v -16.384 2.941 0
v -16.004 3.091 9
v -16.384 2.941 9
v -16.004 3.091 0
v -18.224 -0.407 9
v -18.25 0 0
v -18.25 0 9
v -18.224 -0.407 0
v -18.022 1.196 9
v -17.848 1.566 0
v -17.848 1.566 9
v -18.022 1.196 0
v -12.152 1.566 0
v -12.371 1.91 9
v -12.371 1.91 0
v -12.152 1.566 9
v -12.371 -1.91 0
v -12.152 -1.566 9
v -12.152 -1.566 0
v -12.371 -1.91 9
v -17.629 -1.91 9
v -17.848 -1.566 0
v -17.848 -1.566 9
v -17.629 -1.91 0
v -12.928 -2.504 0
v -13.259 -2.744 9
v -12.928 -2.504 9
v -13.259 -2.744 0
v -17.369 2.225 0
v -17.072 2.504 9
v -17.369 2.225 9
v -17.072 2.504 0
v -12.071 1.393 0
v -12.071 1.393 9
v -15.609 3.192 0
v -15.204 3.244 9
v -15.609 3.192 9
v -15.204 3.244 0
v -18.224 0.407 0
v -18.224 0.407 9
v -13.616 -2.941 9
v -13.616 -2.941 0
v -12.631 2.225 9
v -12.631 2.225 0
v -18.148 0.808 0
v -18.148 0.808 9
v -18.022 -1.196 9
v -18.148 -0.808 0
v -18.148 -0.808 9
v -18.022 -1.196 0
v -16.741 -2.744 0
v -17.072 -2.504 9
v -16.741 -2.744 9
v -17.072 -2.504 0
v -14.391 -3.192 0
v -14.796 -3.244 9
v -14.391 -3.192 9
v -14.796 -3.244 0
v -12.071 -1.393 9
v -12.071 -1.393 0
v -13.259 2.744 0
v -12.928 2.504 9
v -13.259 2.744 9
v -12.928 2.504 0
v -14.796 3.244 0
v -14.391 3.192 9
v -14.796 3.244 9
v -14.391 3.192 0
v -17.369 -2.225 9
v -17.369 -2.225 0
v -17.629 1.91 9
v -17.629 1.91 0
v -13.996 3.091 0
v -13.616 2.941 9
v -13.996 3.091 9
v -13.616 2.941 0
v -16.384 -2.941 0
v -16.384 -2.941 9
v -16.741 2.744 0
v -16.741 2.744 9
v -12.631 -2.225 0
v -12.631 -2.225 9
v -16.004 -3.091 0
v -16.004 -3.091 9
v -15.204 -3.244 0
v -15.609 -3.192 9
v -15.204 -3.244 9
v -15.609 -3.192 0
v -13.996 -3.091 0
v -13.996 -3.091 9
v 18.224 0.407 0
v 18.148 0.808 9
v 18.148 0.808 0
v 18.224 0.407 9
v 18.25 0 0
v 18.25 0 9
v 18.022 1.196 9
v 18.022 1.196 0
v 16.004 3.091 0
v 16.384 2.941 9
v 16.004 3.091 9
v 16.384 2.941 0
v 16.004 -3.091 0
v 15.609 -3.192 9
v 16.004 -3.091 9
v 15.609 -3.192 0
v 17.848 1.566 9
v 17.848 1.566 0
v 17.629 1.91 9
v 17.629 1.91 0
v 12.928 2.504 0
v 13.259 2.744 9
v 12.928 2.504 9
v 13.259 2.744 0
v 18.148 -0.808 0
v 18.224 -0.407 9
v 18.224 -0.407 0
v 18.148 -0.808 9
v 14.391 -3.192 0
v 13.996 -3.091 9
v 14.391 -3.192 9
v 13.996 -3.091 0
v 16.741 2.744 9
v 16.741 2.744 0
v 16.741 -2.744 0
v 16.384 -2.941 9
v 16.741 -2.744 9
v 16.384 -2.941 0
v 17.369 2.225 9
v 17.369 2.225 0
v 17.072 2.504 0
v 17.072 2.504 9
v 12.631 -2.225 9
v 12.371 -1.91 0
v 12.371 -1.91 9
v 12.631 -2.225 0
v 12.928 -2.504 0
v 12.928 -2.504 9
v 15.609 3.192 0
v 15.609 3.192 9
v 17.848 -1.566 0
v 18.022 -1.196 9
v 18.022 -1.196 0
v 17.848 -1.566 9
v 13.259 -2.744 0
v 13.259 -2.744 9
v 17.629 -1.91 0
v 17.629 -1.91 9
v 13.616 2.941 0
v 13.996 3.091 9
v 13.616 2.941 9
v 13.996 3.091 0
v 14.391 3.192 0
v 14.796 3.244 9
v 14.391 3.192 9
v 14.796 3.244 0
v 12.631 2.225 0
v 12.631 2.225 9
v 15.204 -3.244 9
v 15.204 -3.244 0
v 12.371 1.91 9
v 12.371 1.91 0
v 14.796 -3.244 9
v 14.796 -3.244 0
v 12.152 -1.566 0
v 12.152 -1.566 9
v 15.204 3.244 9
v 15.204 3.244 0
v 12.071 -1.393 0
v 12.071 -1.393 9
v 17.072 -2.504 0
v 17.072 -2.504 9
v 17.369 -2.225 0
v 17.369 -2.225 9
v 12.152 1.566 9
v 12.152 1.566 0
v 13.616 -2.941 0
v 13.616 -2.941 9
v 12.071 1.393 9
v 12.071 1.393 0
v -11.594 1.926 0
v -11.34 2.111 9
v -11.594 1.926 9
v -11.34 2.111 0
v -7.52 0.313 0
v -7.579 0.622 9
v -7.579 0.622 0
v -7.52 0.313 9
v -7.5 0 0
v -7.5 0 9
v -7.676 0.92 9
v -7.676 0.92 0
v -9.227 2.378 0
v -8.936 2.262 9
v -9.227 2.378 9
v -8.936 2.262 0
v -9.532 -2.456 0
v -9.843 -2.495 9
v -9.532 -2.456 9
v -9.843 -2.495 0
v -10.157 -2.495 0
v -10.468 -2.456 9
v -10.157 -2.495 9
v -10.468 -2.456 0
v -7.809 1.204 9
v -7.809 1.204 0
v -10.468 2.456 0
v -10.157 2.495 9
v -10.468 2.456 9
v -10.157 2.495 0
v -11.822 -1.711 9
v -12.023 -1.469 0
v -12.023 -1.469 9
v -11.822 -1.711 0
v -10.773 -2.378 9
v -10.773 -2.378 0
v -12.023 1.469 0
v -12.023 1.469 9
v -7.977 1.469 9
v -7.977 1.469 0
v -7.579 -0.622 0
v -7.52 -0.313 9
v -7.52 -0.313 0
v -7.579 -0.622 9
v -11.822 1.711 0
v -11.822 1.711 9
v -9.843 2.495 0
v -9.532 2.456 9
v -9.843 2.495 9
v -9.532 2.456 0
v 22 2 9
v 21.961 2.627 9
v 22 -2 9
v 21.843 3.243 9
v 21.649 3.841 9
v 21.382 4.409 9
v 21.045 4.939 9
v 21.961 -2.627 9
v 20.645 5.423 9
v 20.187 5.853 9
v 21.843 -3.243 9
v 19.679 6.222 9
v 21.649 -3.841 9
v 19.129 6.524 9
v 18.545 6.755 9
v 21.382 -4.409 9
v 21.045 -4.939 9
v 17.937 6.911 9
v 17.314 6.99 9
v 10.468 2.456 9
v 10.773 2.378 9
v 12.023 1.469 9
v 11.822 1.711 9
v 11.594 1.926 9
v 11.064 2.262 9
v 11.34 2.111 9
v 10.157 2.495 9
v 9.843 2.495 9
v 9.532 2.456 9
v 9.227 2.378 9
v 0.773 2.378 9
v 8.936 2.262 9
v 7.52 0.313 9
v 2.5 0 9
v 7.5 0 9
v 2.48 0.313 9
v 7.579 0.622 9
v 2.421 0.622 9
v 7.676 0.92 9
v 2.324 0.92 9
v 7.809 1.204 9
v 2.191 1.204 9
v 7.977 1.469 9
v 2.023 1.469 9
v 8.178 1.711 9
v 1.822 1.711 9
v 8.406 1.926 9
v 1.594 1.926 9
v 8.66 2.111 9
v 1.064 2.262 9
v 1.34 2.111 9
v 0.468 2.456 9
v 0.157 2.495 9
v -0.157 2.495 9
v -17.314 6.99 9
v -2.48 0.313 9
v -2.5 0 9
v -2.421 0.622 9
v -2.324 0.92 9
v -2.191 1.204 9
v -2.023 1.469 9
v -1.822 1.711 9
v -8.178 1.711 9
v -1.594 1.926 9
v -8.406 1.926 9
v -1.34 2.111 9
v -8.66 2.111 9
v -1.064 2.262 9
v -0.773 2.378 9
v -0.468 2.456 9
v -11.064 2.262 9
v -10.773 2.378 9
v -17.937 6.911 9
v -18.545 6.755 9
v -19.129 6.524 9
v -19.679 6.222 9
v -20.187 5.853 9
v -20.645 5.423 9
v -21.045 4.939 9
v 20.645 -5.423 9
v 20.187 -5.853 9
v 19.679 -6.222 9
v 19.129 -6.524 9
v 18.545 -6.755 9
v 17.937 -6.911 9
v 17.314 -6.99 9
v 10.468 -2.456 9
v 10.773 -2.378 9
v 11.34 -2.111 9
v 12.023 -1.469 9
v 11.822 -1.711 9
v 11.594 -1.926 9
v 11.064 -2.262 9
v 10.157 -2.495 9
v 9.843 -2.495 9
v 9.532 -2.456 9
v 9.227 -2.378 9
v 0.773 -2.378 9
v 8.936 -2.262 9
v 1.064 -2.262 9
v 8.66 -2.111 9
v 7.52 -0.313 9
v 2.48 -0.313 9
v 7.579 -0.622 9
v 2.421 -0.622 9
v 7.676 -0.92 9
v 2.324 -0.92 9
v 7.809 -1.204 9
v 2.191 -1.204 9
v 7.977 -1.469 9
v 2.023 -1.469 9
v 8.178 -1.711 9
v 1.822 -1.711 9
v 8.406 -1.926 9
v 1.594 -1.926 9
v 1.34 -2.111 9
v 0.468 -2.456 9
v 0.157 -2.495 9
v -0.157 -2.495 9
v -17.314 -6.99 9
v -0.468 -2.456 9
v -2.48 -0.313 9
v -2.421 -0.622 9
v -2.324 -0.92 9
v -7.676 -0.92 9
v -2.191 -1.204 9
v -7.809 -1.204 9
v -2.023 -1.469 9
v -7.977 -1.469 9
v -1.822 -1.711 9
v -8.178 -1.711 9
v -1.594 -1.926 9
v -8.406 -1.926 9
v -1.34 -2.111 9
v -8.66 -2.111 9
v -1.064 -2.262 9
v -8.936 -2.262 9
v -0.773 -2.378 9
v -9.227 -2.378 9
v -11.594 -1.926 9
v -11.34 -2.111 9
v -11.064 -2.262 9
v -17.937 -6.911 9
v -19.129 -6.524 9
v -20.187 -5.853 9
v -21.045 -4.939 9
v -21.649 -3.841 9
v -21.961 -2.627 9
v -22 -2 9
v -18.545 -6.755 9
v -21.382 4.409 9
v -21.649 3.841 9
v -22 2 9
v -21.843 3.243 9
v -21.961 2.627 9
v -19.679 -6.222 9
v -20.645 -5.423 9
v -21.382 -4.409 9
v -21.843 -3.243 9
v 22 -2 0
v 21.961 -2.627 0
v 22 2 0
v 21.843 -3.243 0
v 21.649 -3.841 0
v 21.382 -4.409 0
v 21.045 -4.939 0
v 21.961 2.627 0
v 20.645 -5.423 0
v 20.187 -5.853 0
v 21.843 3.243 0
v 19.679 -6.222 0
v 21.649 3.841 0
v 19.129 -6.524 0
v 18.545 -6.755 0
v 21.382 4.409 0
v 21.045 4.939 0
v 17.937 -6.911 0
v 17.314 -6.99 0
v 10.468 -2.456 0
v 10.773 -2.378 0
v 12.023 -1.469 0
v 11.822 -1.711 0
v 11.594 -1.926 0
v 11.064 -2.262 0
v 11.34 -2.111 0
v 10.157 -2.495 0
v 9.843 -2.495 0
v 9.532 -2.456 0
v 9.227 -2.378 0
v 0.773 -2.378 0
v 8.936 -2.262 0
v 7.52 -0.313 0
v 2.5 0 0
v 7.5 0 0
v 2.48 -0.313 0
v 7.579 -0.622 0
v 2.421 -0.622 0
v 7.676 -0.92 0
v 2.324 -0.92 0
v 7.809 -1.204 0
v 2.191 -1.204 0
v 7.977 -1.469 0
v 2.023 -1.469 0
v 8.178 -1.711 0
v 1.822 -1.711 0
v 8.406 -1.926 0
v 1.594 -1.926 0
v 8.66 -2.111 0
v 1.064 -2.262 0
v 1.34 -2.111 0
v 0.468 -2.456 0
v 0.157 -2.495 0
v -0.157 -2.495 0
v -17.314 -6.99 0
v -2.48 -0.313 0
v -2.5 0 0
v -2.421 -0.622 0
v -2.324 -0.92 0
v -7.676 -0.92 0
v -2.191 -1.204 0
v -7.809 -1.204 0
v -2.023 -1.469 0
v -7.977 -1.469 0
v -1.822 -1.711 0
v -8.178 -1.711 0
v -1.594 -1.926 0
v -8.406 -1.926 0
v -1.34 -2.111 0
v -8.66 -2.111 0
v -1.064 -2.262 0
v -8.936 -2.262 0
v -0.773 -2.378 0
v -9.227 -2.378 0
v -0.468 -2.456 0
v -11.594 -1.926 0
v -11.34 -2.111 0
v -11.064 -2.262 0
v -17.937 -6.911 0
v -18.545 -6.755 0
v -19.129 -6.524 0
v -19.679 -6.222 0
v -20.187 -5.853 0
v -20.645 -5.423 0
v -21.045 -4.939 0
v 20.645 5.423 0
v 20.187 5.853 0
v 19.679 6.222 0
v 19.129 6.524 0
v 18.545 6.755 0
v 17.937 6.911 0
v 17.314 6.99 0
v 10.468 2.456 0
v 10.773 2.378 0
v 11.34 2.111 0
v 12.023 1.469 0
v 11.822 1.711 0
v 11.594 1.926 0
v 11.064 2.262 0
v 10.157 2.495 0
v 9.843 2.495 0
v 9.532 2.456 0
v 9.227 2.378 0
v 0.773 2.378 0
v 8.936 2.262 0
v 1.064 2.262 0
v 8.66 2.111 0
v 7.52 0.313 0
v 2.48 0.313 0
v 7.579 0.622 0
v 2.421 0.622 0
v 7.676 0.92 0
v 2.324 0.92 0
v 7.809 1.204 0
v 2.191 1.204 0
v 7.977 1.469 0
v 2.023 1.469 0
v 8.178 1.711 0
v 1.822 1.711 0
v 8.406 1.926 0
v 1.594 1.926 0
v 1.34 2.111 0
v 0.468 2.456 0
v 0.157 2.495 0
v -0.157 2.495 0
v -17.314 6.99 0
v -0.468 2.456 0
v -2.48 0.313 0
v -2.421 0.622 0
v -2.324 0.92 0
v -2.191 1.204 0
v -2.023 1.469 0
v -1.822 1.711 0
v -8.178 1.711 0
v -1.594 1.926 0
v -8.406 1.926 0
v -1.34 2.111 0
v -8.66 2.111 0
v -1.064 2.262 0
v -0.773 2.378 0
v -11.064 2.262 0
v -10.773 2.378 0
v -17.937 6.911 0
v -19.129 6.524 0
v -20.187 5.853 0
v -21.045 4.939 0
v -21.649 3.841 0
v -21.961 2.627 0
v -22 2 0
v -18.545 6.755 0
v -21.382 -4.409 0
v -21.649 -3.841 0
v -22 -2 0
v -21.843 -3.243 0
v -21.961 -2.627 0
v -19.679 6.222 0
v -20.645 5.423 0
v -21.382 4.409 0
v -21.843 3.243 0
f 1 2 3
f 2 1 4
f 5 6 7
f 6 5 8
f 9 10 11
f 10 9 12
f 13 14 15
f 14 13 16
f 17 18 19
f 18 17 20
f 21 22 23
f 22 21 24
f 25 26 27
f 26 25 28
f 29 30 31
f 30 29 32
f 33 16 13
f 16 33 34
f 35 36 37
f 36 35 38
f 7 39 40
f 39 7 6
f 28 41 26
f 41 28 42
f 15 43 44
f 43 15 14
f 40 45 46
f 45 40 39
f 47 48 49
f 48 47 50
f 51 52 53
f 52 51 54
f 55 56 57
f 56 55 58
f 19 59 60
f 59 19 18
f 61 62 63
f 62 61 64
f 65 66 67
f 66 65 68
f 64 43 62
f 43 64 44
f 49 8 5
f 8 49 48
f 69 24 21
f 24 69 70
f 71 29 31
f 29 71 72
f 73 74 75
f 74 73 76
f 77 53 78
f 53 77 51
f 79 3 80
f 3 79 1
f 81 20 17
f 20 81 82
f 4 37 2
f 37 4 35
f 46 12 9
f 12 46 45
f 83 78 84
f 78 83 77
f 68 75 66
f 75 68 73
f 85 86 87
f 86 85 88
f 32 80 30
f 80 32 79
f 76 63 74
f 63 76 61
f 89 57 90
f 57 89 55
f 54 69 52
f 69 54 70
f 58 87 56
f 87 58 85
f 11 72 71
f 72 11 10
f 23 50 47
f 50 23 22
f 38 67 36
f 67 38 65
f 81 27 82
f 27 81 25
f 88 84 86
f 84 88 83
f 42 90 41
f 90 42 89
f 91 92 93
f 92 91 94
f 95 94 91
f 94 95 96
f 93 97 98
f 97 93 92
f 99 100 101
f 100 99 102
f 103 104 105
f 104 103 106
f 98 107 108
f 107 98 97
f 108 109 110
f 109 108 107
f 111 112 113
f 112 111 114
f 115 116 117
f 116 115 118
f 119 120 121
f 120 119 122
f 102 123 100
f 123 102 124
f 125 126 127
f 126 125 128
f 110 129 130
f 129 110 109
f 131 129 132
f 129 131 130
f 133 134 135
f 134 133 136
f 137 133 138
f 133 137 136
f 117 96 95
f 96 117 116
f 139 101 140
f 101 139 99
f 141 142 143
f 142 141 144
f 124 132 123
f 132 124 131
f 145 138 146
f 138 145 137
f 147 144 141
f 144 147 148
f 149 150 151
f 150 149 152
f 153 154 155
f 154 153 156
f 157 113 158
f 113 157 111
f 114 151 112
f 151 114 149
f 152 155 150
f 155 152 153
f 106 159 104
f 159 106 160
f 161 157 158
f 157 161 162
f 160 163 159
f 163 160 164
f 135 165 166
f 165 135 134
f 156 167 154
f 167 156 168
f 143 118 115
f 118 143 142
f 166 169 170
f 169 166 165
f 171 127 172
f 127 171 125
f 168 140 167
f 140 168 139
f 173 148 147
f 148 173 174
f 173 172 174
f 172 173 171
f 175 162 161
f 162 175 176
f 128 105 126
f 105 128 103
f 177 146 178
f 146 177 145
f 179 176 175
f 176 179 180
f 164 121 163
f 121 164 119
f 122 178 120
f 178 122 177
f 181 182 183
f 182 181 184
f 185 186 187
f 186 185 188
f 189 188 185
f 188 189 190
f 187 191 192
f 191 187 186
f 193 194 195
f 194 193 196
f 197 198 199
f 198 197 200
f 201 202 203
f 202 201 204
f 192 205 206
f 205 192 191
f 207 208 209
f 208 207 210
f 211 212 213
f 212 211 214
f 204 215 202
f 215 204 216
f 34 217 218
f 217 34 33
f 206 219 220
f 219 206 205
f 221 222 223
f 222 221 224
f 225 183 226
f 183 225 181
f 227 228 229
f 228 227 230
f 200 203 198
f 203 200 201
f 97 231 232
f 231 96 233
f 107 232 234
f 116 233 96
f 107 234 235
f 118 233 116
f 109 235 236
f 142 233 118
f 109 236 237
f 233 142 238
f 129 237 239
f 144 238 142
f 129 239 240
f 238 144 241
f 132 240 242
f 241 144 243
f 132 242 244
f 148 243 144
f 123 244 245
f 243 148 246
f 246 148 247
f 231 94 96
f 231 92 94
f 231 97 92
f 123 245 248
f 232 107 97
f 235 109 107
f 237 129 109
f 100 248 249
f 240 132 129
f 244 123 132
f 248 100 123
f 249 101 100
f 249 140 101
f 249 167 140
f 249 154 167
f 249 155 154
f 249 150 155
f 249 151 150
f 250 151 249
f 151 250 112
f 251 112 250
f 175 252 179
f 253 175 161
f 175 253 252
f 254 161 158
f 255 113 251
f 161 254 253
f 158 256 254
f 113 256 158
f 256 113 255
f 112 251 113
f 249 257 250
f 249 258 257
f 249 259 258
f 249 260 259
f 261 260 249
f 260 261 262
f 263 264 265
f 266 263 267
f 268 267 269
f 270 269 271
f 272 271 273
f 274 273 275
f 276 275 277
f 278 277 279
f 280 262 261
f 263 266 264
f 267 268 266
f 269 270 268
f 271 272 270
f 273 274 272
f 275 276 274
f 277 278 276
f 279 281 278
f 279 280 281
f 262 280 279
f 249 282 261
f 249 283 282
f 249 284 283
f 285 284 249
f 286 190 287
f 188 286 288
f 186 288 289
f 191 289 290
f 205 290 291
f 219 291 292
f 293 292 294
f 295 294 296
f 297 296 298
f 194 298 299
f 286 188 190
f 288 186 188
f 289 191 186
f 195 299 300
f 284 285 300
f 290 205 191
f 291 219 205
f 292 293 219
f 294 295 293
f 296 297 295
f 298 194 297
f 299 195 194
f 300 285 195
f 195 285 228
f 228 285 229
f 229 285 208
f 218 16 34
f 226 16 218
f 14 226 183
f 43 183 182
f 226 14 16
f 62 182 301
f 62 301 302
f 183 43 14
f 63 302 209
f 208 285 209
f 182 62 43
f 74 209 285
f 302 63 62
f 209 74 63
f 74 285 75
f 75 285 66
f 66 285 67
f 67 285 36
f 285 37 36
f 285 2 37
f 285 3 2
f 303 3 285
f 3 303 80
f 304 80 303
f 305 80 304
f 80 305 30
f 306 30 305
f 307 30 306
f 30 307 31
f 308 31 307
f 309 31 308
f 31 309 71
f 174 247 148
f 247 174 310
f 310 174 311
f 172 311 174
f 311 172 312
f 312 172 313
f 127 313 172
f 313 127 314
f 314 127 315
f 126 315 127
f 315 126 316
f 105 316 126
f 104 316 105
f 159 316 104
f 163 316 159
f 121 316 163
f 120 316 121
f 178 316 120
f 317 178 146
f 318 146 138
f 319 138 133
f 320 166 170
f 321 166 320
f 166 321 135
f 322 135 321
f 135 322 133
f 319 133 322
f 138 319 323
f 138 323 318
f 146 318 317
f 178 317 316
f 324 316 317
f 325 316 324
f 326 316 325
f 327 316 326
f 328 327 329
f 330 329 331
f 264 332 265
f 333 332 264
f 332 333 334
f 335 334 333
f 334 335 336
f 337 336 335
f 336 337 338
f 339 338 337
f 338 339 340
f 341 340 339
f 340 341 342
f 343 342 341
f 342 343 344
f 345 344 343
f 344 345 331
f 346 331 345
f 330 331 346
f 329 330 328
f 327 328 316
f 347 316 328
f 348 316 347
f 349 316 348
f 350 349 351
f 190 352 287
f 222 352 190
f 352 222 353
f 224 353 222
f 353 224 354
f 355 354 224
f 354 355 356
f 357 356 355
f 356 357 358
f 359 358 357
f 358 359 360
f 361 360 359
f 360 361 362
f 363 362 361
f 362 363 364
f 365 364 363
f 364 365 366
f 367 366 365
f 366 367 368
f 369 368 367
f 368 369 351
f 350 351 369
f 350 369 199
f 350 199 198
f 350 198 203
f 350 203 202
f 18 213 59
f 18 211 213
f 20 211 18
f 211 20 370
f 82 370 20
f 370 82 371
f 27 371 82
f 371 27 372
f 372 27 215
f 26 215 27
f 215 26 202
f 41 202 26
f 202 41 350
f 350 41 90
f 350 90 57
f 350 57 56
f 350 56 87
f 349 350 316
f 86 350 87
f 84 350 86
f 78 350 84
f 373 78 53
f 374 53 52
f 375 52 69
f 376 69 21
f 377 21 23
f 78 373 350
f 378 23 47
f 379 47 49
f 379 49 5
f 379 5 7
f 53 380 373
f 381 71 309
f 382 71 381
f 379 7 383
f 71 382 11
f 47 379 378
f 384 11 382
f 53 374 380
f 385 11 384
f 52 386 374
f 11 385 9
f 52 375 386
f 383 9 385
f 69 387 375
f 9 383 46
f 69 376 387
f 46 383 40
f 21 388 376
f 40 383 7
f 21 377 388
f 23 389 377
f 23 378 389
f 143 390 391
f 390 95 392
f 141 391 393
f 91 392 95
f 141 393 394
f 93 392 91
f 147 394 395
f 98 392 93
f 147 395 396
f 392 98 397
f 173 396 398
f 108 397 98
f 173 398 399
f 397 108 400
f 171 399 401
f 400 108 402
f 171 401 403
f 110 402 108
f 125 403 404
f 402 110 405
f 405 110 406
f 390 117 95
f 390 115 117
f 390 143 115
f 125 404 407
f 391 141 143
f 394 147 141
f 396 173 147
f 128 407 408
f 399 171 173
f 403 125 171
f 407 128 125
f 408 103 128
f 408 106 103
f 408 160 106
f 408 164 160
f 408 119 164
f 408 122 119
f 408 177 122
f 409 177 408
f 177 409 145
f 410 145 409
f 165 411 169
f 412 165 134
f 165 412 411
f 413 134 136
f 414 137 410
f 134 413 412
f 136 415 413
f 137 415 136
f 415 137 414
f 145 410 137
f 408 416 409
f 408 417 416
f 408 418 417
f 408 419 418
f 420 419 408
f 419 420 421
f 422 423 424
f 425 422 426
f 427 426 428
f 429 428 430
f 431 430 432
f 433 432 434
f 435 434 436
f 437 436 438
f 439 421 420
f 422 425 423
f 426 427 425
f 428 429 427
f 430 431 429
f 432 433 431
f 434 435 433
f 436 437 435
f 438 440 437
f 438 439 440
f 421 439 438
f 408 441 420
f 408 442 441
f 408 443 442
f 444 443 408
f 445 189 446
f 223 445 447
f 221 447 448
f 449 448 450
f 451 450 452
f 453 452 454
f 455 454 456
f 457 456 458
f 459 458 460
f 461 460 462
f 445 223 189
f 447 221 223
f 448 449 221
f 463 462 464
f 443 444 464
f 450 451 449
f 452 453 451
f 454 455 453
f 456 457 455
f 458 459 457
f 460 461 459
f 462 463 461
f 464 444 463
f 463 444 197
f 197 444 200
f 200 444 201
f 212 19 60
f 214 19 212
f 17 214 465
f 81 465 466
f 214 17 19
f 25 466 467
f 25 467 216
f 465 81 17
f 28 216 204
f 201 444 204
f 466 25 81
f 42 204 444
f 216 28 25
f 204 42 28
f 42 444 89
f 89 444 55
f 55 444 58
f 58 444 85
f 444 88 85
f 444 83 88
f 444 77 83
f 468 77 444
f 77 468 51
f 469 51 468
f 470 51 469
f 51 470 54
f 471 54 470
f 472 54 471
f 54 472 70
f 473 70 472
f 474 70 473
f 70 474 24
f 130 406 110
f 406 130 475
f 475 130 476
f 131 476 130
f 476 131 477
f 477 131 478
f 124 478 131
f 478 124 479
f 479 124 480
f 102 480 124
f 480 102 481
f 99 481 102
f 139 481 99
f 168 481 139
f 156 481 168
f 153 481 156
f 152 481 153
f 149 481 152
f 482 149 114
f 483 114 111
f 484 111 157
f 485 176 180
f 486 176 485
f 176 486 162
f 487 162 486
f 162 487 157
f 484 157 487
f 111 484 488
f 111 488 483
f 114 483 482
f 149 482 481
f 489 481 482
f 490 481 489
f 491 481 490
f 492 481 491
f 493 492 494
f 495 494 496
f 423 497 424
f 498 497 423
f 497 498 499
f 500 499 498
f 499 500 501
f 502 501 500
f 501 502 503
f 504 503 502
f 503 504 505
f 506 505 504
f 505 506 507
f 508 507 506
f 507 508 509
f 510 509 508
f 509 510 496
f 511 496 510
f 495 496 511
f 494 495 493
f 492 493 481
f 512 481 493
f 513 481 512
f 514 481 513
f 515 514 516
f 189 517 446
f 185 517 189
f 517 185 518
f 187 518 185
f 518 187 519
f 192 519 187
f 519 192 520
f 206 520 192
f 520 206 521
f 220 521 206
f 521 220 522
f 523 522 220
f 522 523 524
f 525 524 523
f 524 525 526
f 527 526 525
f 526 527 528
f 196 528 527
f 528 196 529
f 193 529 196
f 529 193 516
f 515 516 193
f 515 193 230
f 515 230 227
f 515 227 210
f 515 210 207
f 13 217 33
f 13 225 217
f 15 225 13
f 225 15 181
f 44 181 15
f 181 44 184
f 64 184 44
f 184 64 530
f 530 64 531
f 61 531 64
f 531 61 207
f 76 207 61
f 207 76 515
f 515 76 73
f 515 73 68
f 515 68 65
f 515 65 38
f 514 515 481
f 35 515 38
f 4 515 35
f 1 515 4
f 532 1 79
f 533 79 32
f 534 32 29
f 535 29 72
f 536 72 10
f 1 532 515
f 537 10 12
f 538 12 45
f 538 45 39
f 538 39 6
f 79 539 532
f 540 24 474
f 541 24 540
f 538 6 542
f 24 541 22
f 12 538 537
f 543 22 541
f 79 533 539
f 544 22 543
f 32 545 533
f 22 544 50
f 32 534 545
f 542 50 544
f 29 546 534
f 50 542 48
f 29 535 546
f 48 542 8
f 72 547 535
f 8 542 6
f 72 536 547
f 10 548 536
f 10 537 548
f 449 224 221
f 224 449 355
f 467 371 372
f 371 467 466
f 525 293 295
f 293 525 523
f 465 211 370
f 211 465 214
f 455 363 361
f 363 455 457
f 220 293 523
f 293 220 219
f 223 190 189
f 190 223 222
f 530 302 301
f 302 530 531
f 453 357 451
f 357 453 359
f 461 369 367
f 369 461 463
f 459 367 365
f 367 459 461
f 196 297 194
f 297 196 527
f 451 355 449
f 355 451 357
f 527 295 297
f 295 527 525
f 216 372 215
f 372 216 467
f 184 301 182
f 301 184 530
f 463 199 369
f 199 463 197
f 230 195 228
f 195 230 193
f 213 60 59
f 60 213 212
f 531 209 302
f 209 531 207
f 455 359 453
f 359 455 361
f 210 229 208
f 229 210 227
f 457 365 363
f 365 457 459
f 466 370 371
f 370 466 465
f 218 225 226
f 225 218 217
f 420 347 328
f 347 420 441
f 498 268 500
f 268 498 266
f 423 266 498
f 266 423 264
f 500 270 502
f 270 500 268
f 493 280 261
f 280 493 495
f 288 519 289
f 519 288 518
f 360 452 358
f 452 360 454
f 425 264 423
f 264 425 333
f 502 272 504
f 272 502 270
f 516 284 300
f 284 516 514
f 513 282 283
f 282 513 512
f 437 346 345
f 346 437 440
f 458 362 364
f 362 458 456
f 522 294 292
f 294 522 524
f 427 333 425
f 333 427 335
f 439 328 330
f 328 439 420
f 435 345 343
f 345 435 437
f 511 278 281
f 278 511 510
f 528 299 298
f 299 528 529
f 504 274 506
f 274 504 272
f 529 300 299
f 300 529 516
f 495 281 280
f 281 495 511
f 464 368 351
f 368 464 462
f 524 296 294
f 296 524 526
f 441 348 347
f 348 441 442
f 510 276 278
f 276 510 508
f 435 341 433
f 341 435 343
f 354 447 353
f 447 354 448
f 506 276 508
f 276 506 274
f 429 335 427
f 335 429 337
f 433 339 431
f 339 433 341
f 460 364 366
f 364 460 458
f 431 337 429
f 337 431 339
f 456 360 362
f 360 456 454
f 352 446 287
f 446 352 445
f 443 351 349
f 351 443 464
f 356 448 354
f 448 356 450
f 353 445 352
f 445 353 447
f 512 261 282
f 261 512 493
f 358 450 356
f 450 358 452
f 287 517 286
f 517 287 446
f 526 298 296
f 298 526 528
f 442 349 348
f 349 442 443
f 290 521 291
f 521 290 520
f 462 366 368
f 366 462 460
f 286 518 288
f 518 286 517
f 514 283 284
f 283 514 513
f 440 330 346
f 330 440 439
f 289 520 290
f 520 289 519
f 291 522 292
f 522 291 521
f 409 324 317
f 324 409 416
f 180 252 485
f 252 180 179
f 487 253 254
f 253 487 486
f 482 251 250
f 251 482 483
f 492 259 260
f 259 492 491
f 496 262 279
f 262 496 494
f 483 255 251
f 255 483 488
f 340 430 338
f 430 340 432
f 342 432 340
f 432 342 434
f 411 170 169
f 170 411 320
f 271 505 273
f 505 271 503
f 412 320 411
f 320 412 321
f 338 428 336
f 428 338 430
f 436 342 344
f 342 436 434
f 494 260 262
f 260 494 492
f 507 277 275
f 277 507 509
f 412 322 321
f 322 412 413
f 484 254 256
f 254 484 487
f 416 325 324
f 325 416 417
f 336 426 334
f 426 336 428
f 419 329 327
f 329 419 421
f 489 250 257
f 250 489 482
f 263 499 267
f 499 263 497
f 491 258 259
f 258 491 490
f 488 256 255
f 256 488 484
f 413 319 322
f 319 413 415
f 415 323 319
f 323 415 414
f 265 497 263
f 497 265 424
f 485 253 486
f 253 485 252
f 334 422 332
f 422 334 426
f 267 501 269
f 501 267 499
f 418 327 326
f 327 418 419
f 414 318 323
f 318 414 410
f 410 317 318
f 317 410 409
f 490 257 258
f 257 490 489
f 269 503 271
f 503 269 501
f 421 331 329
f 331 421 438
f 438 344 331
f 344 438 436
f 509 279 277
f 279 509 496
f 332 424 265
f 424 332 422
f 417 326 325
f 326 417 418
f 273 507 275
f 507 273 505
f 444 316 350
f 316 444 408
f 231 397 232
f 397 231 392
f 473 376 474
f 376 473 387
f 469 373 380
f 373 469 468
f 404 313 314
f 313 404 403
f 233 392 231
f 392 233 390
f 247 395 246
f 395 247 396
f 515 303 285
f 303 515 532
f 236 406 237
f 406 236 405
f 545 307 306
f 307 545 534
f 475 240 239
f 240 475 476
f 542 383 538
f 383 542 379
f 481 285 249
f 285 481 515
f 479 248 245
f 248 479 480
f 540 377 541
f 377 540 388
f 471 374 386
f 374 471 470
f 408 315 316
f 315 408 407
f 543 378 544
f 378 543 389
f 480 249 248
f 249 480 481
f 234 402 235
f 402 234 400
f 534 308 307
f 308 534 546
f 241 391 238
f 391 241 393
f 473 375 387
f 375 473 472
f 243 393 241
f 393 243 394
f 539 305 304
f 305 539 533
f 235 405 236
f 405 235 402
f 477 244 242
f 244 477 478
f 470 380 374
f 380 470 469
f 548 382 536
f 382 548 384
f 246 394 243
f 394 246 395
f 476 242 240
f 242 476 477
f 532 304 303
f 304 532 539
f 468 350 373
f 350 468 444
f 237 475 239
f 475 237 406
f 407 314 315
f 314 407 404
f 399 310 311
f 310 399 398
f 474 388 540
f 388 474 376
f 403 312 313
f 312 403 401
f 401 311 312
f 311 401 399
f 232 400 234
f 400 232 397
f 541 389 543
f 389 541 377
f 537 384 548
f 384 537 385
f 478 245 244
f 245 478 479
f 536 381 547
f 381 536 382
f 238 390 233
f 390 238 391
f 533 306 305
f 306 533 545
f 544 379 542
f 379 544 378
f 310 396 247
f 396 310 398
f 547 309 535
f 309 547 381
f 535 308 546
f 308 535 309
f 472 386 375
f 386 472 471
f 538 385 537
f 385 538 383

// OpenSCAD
$fn = 50;

difference() {
	union() {
		hull() {
			translate(v = [-17.0, 2.0, 0]) {
				cylinder(h = 9, r = 5);
			}
			translate(v = [17.0, 2.0, 0]) {
				cylinder(h = 9, r = 5);
			}
			translate(v = [-17.0, -2.0, 0]) {
				cylinder(h = 9, r = 5);
			}
			translate(v = [17.0, -2.0, 0]) {
				cylinder(h = 9, r = 5);
			}
		}
	}
	union() {
		translate(v = [-15.0, 0.0, -100.0]) {
			cylinder(h = 200, r = 3.25);
		}
		translate(v = [15.0, 0.0, -100.0]) {
			cylinder(h = 200, r = 3.25);
		}
		translate(v = [-15.0, 0.0, -100.0]) {
			cylinder(h = 200, r = 1.8);
		}
		translate(v = [15.0, 0.0, -100.0]) {
			cylinder(h = 200, r = 1.8);
		}
		translate(v = [-10.0, 0, 0.0]) {
			cylinder(h = 9, r = 2.5);
		}
		cylinder(h = 9, r = 2.5);
		translate(v = [10.0, 0, 0.0]) {
			cylinder(h = 9, r = 2.5);
		}
	}
}
